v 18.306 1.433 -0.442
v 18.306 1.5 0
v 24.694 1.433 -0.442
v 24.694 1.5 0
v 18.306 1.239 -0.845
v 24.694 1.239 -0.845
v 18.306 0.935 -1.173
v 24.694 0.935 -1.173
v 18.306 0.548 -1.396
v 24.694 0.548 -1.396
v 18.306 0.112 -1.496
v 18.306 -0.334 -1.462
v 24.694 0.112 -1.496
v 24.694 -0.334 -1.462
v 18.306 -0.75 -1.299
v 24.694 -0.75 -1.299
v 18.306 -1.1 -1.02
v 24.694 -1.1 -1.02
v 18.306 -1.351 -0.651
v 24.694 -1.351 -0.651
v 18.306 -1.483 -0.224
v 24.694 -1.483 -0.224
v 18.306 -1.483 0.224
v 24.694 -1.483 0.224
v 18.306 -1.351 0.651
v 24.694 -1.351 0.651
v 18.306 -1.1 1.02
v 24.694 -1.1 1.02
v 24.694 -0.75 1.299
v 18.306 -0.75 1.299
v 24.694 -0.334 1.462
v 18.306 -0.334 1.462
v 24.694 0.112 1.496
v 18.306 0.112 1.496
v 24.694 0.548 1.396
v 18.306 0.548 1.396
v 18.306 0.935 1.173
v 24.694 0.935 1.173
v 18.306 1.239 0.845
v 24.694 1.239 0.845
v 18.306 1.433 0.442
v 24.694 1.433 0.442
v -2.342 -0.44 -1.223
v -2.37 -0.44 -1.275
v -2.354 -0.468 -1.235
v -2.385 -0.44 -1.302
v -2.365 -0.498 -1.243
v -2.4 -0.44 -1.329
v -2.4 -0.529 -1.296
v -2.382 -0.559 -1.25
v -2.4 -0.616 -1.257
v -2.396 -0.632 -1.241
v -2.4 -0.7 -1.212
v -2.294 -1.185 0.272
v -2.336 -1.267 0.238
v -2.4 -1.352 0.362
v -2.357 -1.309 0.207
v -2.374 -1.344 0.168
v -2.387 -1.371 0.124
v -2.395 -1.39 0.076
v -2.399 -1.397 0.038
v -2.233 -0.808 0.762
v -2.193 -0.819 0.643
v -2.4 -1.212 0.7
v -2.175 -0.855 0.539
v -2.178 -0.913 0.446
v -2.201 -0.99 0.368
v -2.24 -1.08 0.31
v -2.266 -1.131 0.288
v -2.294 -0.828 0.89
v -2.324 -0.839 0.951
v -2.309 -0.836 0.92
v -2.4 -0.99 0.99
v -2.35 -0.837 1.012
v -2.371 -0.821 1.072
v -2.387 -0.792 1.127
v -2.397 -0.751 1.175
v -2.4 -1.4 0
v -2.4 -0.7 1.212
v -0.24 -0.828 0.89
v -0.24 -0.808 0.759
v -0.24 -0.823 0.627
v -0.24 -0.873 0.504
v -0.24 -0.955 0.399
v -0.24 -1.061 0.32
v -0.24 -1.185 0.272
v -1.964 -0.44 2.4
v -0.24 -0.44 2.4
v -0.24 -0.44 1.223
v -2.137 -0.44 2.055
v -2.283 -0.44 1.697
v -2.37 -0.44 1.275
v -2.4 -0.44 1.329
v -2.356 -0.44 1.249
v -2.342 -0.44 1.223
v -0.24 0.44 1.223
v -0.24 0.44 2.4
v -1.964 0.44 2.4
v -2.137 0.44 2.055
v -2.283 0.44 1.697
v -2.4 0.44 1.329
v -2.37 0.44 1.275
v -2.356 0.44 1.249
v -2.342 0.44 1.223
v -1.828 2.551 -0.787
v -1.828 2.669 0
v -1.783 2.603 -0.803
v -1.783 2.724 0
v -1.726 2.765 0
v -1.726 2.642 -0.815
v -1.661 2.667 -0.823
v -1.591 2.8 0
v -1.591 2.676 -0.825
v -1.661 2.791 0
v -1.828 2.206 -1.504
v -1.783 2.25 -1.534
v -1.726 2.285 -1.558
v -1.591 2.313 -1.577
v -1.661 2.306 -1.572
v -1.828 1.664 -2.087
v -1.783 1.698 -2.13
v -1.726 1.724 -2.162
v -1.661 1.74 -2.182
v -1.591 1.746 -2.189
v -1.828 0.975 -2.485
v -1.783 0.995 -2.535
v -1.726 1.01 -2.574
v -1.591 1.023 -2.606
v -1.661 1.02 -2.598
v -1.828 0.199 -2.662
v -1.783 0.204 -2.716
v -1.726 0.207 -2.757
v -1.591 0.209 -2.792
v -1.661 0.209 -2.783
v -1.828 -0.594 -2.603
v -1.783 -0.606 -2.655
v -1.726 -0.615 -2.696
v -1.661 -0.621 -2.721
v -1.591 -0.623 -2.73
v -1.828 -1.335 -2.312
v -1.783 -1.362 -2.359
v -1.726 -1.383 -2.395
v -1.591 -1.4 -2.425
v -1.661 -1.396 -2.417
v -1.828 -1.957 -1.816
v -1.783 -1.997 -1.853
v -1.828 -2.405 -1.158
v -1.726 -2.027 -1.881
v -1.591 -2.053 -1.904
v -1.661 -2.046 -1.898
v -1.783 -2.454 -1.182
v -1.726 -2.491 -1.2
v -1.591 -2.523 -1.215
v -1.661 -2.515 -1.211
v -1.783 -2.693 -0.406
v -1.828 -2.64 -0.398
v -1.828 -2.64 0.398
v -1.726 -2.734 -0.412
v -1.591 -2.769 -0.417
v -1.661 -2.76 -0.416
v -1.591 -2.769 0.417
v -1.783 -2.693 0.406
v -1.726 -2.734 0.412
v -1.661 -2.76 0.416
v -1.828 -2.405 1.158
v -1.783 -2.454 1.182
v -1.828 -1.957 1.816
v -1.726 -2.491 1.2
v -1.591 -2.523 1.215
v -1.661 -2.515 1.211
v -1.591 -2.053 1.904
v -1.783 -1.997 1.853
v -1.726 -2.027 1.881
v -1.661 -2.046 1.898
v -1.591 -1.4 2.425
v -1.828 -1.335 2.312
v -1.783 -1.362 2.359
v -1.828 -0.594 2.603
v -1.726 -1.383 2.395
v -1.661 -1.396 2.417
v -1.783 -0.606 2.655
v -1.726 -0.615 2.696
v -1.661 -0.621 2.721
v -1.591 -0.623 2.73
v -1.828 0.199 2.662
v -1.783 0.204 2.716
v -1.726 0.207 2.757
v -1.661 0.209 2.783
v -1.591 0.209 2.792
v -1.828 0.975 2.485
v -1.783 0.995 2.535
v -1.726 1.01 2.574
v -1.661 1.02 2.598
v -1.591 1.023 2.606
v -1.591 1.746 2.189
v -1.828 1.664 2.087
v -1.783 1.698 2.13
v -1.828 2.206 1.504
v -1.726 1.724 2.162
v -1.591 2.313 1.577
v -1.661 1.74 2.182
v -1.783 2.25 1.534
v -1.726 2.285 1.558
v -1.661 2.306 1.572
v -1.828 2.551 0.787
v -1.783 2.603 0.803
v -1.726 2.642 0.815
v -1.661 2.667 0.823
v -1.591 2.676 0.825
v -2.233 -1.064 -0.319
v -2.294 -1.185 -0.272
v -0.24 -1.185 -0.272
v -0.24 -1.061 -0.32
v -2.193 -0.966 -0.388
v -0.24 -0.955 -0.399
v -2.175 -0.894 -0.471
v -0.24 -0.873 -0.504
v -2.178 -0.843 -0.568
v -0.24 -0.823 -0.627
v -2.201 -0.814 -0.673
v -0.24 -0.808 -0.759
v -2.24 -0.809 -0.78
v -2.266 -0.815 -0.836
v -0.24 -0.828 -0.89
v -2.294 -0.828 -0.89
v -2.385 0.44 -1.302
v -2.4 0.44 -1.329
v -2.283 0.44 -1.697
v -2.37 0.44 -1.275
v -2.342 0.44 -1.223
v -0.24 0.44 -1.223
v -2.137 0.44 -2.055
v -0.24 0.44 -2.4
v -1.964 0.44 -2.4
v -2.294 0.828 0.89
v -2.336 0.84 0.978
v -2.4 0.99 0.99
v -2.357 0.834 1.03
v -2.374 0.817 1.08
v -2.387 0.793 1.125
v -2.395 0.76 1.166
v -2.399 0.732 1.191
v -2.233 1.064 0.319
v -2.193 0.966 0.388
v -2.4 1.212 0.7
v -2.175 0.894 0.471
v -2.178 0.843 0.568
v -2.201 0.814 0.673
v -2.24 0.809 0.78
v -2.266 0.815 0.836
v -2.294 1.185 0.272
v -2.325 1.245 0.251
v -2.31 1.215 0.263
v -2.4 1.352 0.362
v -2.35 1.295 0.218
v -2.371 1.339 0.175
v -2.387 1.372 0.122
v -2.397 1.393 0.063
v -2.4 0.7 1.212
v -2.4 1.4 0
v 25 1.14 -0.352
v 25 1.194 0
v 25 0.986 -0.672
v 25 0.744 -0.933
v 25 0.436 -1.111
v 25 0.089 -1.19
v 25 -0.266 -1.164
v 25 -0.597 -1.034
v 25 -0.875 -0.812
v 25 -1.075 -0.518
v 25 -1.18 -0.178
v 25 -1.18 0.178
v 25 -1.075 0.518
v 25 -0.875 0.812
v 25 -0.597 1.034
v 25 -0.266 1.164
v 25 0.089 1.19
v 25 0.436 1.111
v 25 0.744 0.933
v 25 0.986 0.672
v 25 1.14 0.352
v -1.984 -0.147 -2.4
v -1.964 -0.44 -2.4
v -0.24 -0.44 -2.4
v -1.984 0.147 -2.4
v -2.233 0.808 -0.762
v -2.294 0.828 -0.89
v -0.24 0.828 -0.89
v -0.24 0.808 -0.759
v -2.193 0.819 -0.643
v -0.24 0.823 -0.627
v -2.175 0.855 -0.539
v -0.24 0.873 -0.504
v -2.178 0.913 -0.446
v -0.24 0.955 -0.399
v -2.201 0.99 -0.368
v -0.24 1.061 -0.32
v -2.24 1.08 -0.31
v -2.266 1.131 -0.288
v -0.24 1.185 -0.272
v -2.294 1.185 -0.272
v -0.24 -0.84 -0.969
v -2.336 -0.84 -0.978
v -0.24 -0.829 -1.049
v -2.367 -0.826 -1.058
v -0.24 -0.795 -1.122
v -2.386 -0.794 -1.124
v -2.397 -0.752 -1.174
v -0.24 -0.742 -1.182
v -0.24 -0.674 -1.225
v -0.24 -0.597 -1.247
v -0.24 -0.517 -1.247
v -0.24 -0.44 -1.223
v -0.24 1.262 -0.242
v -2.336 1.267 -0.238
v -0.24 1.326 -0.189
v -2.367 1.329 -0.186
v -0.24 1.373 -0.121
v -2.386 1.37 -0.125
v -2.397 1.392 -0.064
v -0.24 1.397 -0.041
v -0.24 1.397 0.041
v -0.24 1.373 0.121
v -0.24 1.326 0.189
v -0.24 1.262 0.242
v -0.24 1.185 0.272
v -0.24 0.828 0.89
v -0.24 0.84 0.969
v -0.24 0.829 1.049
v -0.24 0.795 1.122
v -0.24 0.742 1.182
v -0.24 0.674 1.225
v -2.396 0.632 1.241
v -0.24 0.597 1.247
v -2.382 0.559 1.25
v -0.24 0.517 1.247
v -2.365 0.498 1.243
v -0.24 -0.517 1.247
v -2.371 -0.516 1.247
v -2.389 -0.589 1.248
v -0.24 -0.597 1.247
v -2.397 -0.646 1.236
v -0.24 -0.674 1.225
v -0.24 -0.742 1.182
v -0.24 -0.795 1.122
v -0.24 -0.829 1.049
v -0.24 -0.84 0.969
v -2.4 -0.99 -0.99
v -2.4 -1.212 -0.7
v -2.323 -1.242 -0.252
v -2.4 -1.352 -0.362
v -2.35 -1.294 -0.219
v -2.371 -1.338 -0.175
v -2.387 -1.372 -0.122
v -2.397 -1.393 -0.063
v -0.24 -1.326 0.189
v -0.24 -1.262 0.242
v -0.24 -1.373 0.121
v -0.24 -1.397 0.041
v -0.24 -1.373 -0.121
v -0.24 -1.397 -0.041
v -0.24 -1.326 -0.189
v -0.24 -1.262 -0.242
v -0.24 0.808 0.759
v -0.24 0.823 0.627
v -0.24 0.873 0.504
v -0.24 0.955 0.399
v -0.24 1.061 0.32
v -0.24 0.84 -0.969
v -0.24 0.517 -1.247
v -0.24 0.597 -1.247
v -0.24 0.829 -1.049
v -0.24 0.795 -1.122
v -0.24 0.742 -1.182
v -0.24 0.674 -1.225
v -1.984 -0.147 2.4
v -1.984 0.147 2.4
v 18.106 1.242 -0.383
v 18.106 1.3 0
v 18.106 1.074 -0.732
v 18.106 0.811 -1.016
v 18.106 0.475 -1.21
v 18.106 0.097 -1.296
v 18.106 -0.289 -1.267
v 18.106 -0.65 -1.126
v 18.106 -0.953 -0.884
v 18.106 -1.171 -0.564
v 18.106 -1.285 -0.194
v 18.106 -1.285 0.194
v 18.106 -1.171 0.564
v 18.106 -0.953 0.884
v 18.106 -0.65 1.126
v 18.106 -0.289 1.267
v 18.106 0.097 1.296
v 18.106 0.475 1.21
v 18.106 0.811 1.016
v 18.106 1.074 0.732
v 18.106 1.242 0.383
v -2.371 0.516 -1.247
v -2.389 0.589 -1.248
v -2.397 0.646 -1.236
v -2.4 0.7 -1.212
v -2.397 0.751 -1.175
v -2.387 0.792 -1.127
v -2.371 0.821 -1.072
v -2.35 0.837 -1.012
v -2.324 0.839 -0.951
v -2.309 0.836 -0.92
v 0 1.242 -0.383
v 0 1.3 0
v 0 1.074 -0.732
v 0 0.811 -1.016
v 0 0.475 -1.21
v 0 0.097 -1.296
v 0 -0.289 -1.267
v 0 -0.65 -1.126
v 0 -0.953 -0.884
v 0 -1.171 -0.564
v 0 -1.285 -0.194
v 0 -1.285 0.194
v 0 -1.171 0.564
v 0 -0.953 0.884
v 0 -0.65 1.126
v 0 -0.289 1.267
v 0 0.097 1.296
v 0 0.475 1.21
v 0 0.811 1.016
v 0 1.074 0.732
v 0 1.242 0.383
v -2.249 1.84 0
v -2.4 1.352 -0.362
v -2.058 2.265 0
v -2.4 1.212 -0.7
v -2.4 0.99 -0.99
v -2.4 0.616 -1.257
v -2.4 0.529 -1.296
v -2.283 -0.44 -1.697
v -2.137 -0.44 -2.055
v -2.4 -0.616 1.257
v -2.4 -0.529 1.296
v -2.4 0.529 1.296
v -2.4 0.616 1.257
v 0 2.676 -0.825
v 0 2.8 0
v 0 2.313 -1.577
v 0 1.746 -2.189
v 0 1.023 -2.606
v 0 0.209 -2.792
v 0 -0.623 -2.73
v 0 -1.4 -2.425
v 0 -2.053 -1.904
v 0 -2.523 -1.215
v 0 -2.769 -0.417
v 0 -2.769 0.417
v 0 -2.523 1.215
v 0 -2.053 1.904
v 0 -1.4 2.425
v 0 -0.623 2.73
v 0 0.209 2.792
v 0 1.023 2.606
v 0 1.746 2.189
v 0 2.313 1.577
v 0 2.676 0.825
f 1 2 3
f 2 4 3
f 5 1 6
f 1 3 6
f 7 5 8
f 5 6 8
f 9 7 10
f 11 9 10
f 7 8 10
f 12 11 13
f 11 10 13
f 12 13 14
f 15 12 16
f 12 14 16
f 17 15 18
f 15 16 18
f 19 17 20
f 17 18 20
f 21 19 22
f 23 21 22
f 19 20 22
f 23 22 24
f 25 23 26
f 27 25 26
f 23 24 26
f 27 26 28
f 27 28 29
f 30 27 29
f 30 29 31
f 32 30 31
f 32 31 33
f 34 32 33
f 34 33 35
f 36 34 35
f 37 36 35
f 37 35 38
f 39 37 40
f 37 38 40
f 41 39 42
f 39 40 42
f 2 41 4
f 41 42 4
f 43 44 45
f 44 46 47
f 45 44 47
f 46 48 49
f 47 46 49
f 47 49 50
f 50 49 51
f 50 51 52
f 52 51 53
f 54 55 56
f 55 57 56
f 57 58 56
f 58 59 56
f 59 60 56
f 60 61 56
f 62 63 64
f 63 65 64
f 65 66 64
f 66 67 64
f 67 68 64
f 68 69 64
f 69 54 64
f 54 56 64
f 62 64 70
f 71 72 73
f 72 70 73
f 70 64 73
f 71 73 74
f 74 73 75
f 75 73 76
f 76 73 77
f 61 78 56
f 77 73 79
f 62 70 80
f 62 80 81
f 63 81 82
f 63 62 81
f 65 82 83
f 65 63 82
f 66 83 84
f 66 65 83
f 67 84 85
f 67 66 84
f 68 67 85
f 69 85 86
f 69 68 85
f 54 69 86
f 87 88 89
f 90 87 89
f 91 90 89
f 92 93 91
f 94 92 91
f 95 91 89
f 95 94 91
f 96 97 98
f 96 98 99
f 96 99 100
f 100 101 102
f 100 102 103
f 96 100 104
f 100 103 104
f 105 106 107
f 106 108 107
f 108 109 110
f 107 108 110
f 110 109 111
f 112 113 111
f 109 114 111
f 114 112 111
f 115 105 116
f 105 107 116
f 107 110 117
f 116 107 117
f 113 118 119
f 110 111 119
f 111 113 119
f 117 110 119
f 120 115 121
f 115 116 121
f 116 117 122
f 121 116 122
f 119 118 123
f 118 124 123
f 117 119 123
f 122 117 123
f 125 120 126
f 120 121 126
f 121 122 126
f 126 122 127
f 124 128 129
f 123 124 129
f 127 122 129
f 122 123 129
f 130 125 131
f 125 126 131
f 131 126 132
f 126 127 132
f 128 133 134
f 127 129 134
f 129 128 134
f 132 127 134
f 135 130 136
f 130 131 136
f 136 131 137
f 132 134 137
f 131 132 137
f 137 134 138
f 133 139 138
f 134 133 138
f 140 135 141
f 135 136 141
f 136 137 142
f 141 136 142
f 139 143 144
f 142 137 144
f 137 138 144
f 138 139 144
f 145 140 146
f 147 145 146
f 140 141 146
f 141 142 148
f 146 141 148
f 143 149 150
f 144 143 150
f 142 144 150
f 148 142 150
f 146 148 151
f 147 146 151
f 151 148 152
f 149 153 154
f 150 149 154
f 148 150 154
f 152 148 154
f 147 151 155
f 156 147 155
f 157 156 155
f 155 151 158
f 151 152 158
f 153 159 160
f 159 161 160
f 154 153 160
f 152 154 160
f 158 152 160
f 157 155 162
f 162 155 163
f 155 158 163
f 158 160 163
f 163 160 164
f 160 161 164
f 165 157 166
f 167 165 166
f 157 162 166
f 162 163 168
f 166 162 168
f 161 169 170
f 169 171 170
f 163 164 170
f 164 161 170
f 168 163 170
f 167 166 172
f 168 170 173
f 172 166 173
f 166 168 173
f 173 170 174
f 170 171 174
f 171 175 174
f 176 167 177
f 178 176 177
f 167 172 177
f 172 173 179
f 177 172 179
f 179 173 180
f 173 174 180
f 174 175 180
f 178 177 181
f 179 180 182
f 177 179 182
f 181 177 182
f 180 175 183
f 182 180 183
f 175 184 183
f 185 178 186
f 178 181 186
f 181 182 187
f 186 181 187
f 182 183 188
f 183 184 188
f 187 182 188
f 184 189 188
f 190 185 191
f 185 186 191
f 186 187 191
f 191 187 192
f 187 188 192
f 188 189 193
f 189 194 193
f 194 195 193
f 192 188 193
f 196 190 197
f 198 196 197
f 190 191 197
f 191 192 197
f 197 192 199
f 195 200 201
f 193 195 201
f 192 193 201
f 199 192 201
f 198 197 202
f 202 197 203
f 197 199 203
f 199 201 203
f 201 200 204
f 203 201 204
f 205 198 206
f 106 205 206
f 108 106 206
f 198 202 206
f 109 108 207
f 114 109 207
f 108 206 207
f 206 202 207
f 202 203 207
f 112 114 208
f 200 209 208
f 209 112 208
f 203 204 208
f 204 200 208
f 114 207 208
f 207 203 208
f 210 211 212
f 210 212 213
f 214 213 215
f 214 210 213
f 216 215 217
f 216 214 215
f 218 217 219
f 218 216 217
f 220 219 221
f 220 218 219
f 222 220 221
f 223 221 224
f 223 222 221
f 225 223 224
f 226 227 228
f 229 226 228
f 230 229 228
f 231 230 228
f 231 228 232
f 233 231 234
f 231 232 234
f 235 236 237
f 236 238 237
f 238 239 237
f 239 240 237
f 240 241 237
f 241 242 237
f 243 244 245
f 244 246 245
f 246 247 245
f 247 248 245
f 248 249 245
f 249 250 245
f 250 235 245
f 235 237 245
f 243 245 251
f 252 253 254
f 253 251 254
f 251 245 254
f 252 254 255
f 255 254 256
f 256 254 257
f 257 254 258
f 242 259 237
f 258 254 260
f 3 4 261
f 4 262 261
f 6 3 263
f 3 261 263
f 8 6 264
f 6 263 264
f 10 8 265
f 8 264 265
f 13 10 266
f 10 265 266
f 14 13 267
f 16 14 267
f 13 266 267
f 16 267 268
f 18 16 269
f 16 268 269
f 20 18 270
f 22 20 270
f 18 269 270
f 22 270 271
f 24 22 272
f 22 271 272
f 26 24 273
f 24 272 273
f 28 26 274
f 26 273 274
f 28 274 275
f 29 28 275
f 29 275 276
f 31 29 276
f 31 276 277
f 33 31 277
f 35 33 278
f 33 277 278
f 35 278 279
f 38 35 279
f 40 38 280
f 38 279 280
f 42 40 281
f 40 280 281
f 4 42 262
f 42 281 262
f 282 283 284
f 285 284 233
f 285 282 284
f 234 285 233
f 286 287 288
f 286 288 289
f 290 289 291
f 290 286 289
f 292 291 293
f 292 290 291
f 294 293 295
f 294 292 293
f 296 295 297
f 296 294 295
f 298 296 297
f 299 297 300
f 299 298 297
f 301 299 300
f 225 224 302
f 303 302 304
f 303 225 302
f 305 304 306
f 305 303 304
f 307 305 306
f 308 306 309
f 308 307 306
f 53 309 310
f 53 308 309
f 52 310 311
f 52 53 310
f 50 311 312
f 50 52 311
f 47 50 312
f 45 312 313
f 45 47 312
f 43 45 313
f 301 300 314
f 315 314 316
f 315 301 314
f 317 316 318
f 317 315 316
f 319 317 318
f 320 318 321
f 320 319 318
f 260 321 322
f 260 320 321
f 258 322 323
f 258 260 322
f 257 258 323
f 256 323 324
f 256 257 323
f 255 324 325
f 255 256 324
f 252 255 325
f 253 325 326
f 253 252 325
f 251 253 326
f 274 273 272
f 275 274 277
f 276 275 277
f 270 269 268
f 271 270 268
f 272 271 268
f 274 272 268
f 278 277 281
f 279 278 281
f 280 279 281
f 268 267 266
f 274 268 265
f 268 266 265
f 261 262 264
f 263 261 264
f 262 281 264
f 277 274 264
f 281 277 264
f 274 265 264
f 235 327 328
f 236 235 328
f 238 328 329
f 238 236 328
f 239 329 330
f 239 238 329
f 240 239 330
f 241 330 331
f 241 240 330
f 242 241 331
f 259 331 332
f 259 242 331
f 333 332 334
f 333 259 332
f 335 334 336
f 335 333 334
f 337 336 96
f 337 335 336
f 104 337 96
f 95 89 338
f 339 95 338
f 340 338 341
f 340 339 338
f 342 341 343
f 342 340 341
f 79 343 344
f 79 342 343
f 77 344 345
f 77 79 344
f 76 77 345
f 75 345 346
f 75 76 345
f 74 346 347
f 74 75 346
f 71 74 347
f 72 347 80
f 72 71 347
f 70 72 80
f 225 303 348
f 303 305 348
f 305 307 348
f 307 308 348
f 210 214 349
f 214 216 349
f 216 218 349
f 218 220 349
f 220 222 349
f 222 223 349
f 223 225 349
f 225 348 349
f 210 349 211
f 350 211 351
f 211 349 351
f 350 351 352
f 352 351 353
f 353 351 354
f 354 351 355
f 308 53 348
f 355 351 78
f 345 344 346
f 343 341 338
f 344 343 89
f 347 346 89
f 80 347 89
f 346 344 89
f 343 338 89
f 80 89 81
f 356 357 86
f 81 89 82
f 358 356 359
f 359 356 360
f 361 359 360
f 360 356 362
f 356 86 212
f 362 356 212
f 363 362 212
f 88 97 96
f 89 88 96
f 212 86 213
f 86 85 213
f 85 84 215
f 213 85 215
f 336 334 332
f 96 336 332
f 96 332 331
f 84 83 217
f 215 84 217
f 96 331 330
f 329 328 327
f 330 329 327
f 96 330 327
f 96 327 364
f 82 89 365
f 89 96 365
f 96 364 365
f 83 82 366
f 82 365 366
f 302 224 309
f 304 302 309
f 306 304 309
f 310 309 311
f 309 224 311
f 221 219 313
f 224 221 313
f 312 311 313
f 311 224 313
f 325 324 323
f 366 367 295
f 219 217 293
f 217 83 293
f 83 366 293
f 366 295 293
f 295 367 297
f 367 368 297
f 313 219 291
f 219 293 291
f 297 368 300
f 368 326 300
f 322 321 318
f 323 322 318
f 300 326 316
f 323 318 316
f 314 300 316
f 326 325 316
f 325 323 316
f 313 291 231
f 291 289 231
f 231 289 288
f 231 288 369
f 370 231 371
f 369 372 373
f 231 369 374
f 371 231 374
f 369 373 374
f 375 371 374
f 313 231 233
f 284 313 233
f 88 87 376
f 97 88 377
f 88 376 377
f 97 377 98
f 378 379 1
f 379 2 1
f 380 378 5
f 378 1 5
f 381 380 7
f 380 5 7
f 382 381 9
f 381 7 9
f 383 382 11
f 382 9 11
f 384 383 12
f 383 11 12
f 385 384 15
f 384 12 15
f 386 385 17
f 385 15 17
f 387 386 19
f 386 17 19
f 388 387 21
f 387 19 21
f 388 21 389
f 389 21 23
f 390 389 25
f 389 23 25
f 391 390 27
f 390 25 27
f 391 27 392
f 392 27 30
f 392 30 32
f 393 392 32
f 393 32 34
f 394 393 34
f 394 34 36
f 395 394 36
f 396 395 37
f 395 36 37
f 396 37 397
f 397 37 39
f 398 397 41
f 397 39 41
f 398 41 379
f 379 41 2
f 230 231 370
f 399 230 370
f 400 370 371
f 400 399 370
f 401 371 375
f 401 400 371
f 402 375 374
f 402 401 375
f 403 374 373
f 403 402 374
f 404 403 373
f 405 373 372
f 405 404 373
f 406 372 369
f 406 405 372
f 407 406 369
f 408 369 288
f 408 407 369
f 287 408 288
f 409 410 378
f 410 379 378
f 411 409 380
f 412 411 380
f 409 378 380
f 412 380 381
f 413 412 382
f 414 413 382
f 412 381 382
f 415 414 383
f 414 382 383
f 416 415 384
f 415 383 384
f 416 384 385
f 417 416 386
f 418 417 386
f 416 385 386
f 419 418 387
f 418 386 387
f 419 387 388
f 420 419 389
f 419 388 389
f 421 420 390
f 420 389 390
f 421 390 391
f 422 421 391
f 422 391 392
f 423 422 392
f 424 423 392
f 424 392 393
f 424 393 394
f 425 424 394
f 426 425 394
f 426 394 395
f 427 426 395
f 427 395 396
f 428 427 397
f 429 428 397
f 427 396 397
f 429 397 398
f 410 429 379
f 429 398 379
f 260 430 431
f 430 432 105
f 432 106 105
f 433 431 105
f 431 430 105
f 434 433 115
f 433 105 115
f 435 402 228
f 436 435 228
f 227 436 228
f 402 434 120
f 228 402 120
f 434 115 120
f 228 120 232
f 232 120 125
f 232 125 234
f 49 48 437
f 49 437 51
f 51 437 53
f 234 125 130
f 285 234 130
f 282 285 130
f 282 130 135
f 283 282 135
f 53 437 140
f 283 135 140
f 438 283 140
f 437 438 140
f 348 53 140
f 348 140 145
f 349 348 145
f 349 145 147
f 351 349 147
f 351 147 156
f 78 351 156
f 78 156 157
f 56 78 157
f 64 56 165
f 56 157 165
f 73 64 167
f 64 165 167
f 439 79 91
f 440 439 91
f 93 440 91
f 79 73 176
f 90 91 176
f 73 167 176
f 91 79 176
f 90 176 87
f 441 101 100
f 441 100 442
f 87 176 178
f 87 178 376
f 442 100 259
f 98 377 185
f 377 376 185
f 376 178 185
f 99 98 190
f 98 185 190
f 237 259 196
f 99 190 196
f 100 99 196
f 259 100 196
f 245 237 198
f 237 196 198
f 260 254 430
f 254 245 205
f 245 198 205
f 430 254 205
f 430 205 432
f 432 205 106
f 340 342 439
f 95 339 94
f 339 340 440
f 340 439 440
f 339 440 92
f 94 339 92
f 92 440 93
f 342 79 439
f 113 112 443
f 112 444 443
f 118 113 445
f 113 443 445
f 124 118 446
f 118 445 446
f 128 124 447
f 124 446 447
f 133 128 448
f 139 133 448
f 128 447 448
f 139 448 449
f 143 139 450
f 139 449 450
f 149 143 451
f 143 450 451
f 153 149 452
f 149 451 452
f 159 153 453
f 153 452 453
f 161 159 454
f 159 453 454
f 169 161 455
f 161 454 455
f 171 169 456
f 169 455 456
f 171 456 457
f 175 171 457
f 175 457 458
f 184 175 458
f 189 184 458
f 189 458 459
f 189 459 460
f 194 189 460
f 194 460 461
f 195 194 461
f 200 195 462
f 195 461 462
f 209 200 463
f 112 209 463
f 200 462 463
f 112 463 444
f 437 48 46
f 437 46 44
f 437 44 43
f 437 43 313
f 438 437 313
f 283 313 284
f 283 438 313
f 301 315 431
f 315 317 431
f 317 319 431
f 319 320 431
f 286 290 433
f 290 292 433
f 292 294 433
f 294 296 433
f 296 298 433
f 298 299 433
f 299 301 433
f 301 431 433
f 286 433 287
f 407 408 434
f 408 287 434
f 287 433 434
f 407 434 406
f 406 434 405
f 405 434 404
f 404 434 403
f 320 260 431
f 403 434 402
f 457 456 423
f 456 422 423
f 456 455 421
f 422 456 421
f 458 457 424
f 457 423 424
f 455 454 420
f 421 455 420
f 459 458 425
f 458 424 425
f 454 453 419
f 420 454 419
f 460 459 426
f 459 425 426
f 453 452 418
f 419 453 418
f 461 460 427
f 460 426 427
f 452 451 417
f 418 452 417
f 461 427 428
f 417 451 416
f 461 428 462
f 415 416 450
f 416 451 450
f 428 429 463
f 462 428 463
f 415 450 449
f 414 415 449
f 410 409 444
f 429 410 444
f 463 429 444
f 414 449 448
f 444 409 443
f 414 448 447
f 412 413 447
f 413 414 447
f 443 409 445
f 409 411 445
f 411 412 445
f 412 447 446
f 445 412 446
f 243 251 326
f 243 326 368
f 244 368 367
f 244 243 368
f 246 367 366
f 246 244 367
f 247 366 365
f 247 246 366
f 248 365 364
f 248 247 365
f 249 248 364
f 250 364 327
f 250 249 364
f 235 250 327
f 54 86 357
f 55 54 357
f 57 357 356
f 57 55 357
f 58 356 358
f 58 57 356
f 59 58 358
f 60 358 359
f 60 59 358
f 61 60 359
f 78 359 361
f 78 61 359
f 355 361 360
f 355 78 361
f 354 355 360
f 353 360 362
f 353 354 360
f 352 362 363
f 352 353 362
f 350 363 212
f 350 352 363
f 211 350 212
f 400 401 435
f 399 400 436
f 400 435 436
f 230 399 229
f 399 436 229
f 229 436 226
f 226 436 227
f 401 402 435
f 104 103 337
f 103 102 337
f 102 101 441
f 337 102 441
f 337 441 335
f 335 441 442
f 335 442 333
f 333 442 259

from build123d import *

# Parameters (mm, degrees)
CUT_EXTRUDE1_DEPTH = 2.16
SKETCH3_W          = 4.8
SKETCH3_H          = 0.88
CUT_EXTRUDE2_DEPTH = 2.16


with BuildPart() as part:
    # Sketch1 → Revolve1 (revolve)
    with BuildSketch(Plane.XY):
        with BuildLine():
            Line((-1.591709623, 0), (-2.4, 1.4))
            ThreePointArc((-2.4, 1.4), (-2.158282604, 2.05476512), (-1.827743487, 2.669491525))
            ThreePointArc((-1.827743487, 2.669491525), (-1.726160805, 2.765211773), (-1.590989852, 2.8))
            Line((-1.590989852, 2.8), (0, 2.8))
            Line((0, 2.8), (0, 1.3))
            Line((0, 1.3), (18.1065, 1.3))
            Line((18.1065, 1.3), (18.3065, 1.5))
            Line((18.3065, 1.5), (24.6935, 1.5))
            Line((24.6935, 1.5), (25, 1.1935))
            Line((25, 1.1935), (25, 0))
            Line((25, 0), (-1.591709623, 0))
        make_face()
    revolve(axis=Axis((25, 0, 0), (-1, 0, 0)))

    # Sketch2 → Cut-Extrude1 (cut)
    with BuildSketch(Plane(origin=(-2.4, 0, 0), x_dir=(0, 0, -1), z_dir=(1, 0, 0))):
        with BuildLine():
            ThreePointArc((-1.162126056, -0.356363636), (-1.212435563, -0.700000003), (-0.889682983, -0.828248867))
            ThreePointArc((-0.889682983, -0.828248867), (-0.504218428, -0.873331943), (-0.272443066, -1.184612505))
            ThreePointArc((-0.272443066, -1.184612505), (-6e-09, -1.4), (0.272443063, -1.184612516))
            ThreePointArc((0.272443063, -1.184612516), (0.504218427, -0.873331944), (0.88968299, -0.828248869))
            ThreePointArc((0.88968299, -0.828248869), (1.212435563, -0.700000005), (1.162126064, -0.356363644))
            ThreePointArc((1.162126064, -0.356363644), (1.008436863, -6e-09), (1.162126056, 0.356363636))
            ThreePointArc((1.162126056, 0.356363636), (1.212435565, 0.7), (0.88968299, 0.828248869))
            ThreePointArc((0.88968299, 0.828248869), (0.504218435, 0.873331939), (0.272443068, 1.184612496))
            ThreePointArc((0.272443068, 1.184612496), (7e-09, 1.4), (-0.272443065, 1.18461251))
            ThreePointArc((-0.272443065, 1.18461251), (-0.504218432, 0.873331941), (-0.889682997, 0.828248871))
            ThreePointArc((-0.889682997, 0.828248871), (-1.212435569, 0.699999994), (-1.162126051, 0.356363631))
            ThreePointArc((-1.162126051, 0.356363631), (-1.008436863, -4e-09), (-1.162126056, -0.356363636))
        make_face()
    extrude(amount=CUT_EXTRUDE1_DEPTH, mode=Mode.SUBTRACT)

    # Sketch3 → Cut-Extrude2 (cut)
    with BuildSketch(Plane(origin=(-2.4, 0, 0), x_dir=(0, 0, -1), z_dir=(1, 0, 0))):
        Rectangle(SKETCH3_W, SKETCH3_H)
    extrude(amount=CUT_EXTRUDE2_DEPTH, mode=Mode.SUBTRACT)


solid = part.part
